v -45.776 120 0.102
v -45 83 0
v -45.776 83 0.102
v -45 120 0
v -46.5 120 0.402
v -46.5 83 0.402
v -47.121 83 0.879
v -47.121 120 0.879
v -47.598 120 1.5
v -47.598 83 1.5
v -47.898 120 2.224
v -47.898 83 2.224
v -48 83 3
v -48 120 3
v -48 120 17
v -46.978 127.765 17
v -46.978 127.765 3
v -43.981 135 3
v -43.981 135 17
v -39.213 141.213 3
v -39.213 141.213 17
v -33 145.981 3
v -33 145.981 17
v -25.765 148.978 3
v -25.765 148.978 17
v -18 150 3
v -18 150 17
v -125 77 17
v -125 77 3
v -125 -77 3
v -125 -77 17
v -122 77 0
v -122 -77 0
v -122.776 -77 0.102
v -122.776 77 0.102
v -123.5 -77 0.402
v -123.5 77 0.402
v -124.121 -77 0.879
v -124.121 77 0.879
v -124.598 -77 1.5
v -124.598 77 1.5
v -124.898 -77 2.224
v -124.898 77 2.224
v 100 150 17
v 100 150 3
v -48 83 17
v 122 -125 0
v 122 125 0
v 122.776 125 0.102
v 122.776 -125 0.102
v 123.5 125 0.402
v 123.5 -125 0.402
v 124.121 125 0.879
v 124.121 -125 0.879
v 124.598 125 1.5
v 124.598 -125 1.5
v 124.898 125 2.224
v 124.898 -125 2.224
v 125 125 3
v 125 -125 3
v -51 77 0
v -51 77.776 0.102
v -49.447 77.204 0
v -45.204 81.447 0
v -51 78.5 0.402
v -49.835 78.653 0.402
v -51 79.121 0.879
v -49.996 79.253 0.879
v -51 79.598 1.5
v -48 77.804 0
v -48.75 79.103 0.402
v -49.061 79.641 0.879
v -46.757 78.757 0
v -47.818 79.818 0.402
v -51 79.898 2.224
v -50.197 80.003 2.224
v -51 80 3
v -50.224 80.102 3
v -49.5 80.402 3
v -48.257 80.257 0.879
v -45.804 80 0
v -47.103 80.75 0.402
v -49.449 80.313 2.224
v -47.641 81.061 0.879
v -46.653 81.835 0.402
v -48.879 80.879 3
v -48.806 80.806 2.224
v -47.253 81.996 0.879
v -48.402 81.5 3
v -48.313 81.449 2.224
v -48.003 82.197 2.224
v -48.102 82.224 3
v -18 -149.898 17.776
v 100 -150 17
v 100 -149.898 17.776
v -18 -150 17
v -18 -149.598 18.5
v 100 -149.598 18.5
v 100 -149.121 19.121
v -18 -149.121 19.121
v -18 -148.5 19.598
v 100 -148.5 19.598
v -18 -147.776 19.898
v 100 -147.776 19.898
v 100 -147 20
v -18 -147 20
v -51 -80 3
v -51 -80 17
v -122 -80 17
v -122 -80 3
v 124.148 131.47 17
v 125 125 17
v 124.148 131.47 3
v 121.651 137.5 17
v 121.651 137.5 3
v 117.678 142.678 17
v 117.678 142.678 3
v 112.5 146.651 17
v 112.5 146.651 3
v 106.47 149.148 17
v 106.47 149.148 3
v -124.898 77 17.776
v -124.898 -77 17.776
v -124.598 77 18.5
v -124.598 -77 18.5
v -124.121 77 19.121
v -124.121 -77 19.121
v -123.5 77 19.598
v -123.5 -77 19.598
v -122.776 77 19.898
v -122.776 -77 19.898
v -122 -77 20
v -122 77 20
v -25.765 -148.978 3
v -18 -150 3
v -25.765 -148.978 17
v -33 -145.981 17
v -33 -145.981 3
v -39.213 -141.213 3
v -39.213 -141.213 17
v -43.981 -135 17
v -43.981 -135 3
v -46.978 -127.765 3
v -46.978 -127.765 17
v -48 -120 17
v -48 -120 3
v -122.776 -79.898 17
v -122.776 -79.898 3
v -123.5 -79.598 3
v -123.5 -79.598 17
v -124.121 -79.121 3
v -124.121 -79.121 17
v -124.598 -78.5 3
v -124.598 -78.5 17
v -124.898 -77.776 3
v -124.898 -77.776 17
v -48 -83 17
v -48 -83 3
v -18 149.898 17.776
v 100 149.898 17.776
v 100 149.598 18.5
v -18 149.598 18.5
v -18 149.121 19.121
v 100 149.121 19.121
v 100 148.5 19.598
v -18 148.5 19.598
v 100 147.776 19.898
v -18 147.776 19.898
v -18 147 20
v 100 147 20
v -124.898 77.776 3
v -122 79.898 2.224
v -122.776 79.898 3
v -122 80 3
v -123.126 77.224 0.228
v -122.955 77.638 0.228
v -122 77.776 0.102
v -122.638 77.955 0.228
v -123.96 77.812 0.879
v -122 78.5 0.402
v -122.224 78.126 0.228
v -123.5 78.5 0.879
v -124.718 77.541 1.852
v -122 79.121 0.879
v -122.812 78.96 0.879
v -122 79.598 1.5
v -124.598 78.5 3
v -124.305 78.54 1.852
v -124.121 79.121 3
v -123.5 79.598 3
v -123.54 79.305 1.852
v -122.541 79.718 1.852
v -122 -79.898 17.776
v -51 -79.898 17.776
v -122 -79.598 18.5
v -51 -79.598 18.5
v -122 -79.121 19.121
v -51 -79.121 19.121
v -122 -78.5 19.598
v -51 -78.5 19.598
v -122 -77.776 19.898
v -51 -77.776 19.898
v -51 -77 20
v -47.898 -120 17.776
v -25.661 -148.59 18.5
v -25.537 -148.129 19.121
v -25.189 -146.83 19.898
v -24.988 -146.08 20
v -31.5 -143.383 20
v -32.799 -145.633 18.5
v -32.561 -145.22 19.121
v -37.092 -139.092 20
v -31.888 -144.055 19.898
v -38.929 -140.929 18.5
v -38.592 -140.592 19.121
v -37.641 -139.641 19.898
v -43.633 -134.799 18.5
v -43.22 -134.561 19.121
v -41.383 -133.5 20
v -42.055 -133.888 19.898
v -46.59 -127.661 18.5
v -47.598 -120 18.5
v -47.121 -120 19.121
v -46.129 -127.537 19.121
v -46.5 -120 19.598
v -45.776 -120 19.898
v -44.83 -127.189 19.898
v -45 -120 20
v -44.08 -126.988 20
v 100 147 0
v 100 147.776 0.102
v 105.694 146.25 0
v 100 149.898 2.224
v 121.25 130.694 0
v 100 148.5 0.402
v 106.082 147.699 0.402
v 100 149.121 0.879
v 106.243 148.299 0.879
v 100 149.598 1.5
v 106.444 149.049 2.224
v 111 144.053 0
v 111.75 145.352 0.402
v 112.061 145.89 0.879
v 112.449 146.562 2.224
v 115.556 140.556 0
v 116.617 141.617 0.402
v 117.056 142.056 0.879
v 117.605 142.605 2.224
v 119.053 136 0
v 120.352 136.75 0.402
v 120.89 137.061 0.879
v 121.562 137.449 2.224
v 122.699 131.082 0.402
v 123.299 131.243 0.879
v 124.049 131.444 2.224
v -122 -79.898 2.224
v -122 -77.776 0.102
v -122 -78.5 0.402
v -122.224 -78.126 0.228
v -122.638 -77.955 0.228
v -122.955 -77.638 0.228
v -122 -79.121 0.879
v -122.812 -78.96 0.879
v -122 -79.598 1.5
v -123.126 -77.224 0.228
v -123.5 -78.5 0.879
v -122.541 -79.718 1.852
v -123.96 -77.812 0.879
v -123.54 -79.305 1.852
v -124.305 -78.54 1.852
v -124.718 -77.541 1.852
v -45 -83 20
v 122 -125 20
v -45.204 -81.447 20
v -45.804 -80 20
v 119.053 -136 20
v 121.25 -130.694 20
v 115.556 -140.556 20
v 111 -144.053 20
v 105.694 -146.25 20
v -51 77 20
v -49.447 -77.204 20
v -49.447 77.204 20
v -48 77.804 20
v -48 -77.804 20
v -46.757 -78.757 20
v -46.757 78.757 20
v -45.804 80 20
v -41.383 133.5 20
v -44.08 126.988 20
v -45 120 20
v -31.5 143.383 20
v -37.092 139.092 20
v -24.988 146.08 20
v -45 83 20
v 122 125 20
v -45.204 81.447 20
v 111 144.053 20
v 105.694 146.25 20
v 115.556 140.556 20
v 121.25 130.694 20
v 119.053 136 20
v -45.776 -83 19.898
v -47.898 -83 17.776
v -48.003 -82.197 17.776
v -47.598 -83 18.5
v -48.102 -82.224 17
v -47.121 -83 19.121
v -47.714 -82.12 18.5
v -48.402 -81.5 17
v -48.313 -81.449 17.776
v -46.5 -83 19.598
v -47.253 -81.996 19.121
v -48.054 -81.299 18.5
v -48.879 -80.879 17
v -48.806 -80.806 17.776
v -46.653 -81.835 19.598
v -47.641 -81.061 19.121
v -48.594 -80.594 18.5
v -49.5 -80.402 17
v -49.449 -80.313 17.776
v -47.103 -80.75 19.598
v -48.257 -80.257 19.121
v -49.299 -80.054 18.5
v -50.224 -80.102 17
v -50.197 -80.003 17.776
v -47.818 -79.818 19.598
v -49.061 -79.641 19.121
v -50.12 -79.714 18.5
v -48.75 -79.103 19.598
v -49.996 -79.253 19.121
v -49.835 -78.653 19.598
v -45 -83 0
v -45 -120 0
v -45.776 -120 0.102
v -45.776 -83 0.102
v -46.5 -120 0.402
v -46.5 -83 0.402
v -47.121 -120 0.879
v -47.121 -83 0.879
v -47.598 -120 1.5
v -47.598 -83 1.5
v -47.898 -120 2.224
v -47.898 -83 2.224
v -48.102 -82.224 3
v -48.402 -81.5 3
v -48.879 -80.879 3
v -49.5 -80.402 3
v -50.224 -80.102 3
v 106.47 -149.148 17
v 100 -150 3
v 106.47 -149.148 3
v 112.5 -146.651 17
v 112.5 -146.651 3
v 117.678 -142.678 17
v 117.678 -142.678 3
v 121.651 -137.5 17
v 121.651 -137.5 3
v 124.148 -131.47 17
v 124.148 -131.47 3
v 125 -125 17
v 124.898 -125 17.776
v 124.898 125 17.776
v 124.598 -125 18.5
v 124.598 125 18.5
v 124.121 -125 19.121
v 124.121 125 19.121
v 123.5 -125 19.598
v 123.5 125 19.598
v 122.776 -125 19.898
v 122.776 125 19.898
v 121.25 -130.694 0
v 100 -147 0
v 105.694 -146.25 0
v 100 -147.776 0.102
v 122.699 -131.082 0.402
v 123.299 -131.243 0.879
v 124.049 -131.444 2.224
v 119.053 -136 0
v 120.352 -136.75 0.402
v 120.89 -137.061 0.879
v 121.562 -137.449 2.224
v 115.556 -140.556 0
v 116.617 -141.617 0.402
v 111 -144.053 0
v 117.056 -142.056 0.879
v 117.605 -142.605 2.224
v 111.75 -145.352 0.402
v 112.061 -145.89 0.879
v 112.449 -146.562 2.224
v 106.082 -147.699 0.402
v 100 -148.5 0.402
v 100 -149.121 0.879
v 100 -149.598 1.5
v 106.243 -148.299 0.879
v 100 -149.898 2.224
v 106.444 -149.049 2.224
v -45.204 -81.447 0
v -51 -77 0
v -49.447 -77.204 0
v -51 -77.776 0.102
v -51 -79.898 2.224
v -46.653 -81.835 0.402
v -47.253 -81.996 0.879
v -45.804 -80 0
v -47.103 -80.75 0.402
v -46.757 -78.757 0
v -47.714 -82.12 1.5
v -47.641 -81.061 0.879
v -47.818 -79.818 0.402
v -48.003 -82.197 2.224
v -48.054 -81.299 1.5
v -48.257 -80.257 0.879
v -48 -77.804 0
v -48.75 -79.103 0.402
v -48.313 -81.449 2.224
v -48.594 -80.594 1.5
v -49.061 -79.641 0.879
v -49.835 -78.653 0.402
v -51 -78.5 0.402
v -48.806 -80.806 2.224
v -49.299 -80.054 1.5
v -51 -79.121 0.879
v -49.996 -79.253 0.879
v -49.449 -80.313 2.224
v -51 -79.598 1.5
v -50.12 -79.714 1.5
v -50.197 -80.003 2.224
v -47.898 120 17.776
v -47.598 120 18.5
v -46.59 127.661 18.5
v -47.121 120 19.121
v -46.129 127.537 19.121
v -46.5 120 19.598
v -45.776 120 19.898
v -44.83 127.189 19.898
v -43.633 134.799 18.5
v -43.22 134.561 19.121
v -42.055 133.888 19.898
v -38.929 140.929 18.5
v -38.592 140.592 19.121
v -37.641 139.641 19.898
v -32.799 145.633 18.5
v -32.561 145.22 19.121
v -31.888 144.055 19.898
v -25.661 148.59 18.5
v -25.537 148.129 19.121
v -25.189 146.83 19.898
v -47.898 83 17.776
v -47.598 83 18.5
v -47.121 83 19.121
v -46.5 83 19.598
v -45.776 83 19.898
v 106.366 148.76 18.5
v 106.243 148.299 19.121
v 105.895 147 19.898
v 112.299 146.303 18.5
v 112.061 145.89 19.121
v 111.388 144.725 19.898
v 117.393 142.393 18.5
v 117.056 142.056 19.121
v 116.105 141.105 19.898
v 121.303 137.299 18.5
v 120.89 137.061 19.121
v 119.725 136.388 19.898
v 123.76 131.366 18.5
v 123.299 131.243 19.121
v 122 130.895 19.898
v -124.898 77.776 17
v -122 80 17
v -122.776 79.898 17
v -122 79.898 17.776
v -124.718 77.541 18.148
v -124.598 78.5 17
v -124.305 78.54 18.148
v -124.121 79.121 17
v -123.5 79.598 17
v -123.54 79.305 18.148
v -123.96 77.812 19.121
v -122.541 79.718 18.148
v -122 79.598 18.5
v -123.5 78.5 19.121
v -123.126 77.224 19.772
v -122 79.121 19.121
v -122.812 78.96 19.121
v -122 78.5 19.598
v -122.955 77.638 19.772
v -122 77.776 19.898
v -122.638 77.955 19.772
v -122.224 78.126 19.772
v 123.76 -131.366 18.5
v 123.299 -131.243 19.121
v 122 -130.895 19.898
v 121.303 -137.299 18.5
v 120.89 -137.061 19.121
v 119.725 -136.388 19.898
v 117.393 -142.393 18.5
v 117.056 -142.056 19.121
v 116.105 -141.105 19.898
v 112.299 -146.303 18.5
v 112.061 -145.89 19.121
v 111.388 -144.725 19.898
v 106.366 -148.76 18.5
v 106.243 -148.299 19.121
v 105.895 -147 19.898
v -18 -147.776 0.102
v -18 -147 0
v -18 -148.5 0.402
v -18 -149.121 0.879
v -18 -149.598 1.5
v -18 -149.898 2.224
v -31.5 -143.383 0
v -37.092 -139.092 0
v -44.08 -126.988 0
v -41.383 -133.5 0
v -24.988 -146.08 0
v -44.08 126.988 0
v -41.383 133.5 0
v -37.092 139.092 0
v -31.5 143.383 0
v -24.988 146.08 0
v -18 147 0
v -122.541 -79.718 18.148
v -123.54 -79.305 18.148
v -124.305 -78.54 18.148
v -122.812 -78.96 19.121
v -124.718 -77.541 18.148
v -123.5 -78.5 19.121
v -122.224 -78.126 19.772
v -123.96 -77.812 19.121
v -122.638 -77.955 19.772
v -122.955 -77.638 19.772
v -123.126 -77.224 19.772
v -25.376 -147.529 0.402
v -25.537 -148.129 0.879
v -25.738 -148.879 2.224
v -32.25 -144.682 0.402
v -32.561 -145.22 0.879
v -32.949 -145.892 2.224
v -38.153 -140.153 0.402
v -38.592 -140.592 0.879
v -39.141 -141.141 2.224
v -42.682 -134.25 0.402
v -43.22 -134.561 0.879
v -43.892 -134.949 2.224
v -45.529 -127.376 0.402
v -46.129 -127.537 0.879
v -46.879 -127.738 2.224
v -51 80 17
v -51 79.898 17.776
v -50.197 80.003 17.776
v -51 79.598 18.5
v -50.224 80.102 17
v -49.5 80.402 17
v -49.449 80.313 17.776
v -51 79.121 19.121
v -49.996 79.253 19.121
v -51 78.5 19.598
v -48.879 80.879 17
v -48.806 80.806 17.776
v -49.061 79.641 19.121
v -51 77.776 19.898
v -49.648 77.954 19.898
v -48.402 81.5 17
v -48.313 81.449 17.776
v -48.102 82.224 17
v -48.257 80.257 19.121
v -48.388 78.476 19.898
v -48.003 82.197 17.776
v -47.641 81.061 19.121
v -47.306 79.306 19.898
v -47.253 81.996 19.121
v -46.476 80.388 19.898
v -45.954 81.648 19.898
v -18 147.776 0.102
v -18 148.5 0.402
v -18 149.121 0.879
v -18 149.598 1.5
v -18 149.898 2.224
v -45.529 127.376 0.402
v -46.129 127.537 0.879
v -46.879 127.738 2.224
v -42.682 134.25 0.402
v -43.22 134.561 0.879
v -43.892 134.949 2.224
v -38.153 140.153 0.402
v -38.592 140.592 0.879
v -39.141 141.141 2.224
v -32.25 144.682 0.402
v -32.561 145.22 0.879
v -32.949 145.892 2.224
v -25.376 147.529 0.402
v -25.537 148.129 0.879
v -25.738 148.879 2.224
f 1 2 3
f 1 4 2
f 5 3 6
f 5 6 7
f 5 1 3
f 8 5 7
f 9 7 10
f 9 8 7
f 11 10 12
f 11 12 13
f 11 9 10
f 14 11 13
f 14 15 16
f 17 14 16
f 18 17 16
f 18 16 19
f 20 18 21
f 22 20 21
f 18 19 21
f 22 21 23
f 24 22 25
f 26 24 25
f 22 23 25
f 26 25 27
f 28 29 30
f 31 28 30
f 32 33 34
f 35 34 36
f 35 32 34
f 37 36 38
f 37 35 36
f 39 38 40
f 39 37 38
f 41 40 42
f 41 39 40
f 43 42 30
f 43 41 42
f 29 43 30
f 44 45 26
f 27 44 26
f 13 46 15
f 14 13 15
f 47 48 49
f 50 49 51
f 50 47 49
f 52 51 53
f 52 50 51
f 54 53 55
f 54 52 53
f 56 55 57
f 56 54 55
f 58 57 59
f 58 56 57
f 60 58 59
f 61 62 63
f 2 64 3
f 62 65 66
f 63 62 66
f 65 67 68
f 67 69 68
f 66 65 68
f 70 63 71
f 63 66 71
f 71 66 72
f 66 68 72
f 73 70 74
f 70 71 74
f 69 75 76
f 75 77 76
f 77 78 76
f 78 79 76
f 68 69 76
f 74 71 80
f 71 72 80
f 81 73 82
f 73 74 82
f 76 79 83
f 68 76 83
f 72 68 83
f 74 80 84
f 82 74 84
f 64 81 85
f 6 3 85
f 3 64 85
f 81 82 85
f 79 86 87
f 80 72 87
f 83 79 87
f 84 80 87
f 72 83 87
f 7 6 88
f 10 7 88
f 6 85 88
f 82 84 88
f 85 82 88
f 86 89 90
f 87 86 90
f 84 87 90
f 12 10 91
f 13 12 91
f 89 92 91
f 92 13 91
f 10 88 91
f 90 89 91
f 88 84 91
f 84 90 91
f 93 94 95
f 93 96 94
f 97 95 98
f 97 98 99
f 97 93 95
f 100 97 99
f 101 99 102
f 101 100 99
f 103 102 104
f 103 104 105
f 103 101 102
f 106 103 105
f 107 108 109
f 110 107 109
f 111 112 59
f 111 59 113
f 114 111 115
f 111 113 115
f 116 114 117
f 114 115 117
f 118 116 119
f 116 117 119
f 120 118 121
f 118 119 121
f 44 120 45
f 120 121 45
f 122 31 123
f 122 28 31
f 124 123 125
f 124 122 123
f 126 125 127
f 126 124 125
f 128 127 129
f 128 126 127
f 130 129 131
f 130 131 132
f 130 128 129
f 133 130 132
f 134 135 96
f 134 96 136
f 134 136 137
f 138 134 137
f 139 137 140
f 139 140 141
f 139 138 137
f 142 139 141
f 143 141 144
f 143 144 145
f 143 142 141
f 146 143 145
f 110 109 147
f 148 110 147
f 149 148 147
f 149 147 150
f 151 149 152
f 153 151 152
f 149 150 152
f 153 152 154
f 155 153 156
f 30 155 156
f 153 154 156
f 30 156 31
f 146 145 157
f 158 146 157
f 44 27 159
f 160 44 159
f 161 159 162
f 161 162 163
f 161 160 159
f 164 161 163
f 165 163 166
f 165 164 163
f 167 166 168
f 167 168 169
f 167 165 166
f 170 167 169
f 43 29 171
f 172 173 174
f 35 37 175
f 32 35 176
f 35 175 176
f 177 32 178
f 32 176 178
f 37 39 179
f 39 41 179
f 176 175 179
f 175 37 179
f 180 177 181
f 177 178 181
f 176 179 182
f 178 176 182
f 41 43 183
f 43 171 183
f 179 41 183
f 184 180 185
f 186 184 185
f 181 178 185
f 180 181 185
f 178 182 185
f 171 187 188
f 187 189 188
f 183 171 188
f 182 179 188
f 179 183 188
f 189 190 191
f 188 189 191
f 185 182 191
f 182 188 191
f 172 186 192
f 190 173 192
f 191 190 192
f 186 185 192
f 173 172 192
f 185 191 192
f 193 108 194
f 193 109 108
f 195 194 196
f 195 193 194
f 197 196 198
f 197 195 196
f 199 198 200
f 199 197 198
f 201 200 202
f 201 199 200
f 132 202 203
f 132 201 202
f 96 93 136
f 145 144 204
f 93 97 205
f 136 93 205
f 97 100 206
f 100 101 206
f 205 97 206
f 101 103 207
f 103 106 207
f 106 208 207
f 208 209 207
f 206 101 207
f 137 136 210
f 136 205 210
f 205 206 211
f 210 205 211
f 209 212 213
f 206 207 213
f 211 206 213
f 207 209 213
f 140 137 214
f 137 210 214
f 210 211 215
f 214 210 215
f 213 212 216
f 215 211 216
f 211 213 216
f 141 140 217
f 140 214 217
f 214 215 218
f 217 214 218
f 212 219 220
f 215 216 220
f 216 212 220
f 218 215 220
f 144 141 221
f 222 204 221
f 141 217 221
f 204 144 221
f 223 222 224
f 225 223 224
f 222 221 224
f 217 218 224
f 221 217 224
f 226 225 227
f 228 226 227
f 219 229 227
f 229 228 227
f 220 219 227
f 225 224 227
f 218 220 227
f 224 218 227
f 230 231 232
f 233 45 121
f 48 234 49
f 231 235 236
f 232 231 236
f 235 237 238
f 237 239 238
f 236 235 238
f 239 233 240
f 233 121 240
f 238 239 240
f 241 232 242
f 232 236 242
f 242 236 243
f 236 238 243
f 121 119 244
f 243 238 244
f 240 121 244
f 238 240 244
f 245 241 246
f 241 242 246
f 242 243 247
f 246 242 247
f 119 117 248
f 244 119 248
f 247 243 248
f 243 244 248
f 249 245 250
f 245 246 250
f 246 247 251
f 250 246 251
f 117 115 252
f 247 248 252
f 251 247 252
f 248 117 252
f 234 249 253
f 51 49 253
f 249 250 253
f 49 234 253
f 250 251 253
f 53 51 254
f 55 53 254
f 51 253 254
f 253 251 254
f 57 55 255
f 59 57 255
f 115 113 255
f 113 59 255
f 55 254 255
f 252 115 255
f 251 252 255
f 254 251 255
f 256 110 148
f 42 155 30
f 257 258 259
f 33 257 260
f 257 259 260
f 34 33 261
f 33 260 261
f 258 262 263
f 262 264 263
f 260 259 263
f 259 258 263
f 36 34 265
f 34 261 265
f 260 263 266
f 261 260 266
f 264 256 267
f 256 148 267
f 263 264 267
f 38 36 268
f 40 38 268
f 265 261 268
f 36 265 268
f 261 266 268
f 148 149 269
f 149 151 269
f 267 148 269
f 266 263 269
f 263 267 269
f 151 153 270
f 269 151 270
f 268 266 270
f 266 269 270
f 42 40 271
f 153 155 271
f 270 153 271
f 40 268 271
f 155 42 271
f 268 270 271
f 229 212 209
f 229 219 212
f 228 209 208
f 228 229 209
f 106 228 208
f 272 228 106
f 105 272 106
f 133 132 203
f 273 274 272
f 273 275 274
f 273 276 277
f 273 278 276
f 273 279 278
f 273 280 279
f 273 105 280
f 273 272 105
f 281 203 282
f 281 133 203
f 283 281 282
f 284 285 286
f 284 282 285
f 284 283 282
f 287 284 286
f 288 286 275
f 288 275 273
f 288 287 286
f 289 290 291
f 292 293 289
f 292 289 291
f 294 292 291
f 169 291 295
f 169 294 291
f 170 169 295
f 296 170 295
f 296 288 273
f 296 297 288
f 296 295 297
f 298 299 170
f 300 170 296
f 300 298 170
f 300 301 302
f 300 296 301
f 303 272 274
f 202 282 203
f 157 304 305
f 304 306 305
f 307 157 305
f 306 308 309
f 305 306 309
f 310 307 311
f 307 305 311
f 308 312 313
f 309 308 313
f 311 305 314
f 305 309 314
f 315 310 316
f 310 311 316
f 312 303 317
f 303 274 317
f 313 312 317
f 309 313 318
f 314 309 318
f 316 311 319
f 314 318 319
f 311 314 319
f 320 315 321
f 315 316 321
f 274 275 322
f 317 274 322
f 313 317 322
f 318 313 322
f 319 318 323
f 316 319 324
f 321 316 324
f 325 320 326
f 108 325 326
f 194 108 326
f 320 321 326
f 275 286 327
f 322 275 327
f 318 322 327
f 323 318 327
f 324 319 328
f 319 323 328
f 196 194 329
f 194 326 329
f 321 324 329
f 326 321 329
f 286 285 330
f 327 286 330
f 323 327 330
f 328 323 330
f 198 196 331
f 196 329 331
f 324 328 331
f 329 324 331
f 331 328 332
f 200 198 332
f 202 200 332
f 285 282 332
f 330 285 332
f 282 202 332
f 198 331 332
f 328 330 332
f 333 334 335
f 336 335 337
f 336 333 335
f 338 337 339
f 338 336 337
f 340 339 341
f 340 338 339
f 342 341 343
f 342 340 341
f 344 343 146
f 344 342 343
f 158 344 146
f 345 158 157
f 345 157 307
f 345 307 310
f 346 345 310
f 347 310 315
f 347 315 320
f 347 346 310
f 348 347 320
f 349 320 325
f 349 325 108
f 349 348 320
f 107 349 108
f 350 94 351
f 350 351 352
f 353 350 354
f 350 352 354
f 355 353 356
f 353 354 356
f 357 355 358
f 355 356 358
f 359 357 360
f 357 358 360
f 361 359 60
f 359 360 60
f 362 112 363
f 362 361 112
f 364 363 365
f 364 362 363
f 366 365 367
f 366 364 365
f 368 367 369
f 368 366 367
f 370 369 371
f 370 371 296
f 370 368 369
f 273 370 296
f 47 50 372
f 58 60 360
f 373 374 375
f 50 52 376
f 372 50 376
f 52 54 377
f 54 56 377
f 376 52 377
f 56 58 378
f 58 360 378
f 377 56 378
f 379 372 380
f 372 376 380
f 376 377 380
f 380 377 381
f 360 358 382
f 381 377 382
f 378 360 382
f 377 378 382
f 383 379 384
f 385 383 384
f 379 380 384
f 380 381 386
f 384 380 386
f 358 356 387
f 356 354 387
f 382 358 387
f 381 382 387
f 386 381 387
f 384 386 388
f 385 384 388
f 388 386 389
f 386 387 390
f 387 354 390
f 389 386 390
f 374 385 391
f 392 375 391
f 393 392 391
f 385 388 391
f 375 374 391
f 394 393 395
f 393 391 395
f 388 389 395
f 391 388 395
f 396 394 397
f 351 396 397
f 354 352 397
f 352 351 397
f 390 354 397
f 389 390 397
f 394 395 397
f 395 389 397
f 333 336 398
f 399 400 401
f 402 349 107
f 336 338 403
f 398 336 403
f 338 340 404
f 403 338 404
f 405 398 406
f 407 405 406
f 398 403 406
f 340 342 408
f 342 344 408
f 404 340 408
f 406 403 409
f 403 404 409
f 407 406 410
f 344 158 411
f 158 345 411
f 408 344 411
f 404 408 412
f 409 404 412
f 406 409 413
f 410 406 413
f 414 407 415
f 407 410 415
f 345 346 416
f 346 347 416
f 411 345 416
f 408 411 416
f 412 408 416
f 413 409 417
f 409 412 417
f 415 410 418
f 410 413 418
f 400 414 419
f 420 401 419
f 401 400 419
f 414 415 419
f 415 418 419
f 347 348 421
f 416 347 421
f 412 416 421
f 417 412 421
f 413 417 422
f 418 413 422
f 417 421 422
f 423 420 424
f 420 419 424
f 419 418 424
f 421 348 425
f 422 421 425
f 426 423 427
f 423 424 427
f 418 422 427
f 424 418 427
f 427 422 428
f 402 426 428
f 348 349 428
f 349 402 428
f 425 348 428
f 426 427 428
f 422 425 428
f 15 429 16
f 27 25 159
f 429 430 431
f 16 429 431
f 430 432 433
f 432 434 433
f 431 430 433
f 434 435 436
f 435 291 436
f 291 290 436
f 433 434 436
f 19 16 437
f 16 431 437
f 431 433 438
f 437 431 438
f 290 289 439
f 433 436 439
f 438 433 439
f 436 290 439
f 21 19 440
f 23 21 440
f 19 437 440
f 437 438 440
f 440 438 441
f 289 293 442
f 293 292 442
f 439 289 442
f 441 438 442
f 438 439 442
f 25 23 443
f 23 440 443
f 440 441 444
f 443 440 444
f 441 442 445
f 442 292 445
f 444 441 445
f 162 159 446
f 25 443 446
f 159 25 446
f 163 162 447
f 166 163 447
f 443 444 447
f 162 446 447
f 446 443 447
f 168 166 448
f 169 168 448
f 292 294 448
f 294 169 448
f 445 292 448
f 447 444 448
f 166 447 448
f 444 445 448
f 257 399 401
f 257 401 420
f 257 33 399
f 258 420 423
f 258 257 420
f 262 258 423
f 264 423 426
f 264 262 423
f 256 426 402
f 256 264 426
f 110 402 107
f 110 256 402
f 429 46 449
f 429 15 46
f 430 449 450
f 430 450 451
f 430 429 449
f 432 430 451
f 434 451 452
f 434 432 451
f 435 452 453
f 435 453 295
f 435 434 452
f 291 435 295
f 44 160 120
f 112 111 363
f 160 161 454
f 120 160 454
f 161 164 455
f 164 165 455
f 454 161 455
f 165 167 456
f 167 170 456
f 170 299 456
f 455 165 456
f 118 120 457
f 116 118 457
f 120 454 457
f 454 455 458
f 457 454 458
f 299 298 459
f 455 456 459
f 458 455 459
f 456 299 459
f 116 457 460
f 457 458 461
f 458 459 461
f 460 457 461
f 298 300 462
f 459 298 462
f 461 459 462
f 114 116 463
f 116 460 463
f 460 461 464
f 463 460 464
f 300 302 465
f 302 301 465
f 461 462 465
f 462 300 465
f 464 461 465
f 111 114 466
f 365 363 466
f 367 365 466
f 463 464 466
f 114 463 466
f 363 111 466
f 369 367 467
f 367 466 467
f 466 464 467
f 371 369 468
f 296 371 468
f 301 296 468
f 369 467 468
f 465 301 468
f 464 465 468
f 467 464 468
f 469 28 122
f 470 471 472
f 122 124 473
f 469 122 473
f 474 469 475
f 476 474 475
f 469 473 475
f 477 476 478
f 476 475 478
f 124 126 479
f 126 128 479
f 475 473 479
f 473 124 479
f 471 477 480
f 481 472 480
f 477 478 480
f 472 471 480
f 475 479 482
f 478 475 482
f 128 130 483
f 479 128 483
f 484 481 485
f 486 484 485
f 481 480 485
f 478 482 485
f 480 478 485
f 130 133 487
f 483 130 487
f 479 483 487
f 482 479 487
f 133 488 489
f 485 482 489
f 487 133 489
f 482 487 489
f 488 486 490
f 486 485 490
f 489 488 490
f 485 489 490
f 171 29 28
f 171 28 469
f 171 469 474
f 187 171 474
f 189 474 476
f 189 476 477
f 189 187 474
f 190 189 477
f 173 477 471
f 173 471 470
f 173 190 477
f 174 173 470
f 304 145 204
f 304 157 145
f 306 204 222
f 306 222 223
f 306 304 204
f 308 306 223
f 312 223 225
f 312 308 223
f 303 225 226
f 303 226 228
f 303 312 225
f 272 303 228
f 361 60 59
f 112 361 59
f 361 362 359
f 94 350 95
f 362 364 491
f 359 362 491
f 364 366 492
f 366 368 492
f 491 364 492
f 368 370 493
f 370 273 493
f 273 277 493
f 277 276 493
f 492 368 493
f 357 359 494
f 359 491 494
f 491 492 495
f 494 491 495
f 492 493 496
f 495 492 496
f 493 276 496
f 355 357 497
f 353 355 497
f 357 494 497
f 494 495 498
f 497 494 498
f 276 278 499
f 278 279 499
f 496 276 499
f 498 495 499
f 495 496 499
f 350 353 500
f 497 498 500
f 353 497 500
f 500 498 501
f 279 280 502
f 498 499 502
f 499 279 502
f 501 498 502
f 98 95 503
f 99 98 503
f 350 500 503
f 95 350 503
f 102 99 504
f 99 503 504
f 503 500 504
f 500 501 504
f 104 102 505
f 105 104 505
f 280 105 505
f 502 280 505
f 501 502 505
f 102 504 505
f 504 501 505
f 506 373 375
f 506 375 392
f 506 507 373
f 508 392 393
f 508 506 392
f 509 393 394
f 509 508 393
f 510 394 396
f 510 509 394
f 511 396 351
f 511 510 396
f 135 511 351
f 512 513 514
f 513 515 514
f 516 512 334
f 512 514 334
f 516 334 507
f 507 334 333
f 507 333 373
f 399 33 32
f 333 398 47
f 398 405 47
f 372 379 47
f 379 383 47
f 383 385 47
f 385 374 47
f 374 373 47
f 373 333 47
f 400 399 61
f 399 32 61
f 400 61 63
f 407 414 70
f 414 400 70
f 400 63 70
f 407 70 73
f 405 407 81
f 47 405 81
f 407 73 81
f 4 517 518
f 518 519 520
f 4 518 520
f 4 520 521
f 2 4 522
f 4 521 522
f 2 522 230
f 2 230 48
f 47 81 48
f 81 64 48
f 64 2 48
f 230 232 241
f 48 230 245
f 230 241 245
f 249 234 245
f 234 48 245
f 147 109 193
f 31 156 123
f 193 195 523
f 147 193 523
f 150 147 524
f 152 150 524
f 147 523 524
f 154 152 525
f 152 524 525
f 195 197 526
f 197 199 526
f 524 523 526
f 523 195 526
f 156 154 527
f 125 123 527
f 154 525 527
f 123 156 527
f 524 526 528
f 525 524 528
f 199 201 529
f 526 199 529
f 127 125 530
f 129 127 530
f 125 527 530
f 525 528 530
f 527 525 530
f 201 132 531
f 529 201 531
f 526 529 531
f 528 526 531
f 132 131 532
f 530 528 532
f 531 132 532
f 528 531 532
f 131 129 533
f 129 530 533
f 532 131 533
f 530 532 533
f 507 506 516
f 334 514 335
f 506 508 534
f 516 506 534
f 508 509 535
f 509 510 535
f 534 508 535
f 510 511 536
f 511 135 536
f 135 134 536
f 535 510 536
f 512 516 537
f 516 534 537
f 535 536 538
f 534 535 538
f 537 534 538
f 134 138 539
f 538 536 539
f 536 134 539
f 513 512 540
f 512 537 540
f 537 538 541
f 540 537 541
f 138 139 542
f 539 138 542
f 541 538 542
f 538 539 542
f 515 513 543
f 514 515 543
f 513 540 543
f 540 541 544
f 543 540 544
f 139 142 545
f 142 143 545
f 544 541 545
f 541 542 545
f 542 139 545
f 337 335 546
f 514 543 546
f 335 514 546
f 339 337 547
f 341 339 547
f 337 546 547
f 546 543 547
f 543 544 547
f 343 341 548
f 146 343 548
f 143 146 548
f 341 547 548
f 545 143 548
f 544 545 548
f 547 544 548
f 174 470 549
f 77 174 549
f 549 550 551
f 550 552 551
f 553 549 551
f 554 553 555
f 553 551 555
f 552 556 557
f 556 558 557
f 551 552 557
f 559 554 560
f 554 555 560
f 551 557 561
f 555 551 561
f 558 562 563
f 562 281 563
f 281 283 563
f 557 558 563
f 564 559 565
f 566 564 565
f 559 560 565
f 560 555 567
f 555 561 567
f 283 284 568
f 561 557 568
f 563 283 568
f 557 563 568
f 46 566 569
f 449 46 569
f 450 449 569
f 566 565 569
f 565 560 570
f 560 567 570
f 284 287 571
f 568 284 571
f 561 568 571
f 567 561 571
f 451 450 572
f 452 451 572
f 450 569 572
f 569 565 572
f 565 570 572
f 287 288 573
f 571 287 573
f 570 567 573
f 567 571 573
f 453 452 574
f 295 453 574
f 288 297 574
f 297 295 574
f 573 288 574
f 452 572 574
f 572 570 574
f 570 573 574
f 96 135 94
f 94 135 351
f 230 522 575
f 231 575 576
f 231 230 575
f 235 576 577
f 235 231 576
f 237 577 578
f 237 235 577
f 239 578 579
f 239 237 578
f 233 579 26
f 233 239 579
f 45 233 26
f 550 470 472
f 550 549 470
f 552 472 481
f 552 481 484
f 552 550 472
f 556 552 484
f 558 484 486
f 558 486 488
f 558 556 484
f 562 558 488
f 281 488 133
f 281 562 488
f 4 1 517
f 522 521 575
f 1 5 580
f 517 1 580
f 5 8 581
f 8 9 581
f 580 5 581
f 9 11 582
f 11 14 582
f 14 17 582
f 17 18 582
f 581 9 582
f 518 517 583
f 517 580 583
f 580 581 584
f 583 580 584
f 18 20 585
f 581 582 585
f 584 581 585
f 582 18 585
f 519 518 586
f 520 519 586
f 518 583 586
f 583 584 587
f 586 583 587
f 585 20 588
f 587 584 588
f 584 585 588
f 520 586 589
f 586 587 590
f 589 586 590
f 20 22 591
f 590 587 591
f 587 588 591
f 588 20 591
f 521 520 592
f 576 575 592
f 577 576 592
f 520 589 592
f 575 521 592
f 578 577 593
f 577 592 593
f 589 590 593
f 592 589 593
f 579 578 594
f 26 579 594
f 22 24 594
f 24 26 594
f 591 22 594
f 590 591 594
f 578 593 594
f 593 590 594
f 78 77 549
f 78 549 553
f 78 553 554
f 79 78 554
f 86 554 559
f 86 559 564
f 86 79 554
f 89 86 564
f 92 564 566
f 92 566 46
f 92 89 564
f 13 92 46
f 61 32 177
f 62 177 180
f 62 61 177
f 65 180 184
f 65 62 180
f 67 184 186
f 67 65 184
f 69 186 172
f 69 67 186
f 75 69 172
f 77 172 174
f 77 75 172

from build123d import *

# Parameters (mm, degrees)
F1_DEPTH = 20
F3_DEPTH = 25
F4_R     = 30
F5_R     = 3
F6_R     = 3


with BuildPart() as f1:
    # F0 (on Top) → F1 (new body)
    with BuildSketch(Plane.XY):
        with BuildLine():
            Line((-100, -150), (100, -150))
            ThreePointArc((100, -150), (117.67767, -142.67767), (125, -125))
            Line((125, -125), (125, 125))
            ThreePointArc((125, 125), (117.67767, 142.67767), (100, 150))
            Line((100, 150), (-100, 150))
            ThreePointArc((-100, 150), (-117.67767, 142.67767), (-125, 125))
            Line((-125, 125), (-125, -125))
            ThreePointArc((-125, -125), (-117.67767, -142.67767), (-100, -150))
        make_face()
    extrude(amount=F1_DEPTH)

    # F2 (on face) → F3 (cut)
    with BuildSketch(Plane.XY.offset(20)):
        with BuildLine():
            Line((-48, -80), (-125, -80))
            Line((-125, -80), (-125, -125))
            ThreePointArc((-125, -125), (-117.67767, -142.67767), (-100, -150))
            Line((-100, -150), (-48, -150))
            Line((-48, -150), (-48, -80))
        make_face()
        with BuildLine():
            Line((-125, -80), (-146.106765, -80))
            Line((-146.106765, -80), (-146.106765, -176.229358))
            Line((-146.106765, -176.229358), (-48, -176.229358))
            Line((-48, -176.229358), (-48, -150))
            Line((-48, -150), (-100, -150))
            ThreePointArc((-100, -150), (-117.67767, -142.67767), (-125, -125))
            Line((-125, -125), (-125, -80))
        make_face()
        with BuildLine():
            Line((-146.106765, 80), (-125, 80))
            Line((-125, 80), (-125, 125))
            ThreePointArc((-125, 125), (-117.67767, 142.67767), (-100, 150))
            Line((-100, 150), (-48, 150))
            Line((-48, 150), (-48, 176.229358))
            Line((-48, 176.229358), (-146.106765, 176.229358))
            Line((-146.106765, 176.229358), (-146.106765, 80))
        make_face()
        with BuildLine():
            Line((-125, 125), (-125, 80))
            Line((-125, 80), (-48, 80))
            Line((-48, 80), (-48, 150))
            Line((-48, 150), (-100, 150))
            ThreePointArc((-100, 150), (-117.67767, 142.67767), (-125, 125))
        make_face()
    extrude(amount=-F3_DEPTH, mode=Mode.SUBTRACT)

    # F4
    f4_edges = [f1.edges().sort_by_distance(p)[0] for p in [
        (-48, -150, 10),
        (-48, 150, 10),
    ]]
    fillet(f4_edges, radius=F4_R)

    # F5
    f5_edges = [f1.edges().sort_by_distance(p)[0] for p in [
        (-48, 80, 10),
        (-125, 80, 10),
        (-48, -80, 10),
        (-125, -80, 10),
    ]]
    fillet(f5_edges, radius=F5_R)

    # F6
    f6_edges = [f1.edges().sort_by_distance(p)[0] for p in [
        (-48, 101.5, 20),
        (-48.87868, 80.87868, 20),
        (-39.213203, 141.213203, 20),
        (-86.5, 80, 20),
        (41, 150, 20),
        (-124.12132, 79.12132, 20),
        (117.67767, 142.67767, 20),
        (-125, 0, 20),
        (125, 0, 20),
        (-124.12132, -79.12132, 20),
        (117.67767, -142.67767, 20),
        (-86.5, -80, 20),
        (41, -150, 20),
        (-48.87868, -80.87868, 20),
        (-39.213203, -141.213203, 20),
        (-48, -101.5, 20),
        (-48, 101.5, 0),
        (-48.87868, 80.87868, 0),
        (-39.213203, 141.213203, 0),
        (-86.5, 80, 0),
        (41, 150, 0),
        (-124.12132, 79.12132, 0),
        (117.67767, 142.67767, 0),
        (-125, 0, 0),
        (125, 0, 0),
        (-124.12132, -79.12132, 0),
        (117.67767, -142.67767, 0),
        (-86.5, -80, 0),
        (41, -150, 0),
        (-48.87868, -80.87868, 0),
        (-39.213203, -141.213203, 0),
        (-48, -101.5, 0),
    ]]
    fillet(f6_edges, radius=F6_R)


solid = f1.part
